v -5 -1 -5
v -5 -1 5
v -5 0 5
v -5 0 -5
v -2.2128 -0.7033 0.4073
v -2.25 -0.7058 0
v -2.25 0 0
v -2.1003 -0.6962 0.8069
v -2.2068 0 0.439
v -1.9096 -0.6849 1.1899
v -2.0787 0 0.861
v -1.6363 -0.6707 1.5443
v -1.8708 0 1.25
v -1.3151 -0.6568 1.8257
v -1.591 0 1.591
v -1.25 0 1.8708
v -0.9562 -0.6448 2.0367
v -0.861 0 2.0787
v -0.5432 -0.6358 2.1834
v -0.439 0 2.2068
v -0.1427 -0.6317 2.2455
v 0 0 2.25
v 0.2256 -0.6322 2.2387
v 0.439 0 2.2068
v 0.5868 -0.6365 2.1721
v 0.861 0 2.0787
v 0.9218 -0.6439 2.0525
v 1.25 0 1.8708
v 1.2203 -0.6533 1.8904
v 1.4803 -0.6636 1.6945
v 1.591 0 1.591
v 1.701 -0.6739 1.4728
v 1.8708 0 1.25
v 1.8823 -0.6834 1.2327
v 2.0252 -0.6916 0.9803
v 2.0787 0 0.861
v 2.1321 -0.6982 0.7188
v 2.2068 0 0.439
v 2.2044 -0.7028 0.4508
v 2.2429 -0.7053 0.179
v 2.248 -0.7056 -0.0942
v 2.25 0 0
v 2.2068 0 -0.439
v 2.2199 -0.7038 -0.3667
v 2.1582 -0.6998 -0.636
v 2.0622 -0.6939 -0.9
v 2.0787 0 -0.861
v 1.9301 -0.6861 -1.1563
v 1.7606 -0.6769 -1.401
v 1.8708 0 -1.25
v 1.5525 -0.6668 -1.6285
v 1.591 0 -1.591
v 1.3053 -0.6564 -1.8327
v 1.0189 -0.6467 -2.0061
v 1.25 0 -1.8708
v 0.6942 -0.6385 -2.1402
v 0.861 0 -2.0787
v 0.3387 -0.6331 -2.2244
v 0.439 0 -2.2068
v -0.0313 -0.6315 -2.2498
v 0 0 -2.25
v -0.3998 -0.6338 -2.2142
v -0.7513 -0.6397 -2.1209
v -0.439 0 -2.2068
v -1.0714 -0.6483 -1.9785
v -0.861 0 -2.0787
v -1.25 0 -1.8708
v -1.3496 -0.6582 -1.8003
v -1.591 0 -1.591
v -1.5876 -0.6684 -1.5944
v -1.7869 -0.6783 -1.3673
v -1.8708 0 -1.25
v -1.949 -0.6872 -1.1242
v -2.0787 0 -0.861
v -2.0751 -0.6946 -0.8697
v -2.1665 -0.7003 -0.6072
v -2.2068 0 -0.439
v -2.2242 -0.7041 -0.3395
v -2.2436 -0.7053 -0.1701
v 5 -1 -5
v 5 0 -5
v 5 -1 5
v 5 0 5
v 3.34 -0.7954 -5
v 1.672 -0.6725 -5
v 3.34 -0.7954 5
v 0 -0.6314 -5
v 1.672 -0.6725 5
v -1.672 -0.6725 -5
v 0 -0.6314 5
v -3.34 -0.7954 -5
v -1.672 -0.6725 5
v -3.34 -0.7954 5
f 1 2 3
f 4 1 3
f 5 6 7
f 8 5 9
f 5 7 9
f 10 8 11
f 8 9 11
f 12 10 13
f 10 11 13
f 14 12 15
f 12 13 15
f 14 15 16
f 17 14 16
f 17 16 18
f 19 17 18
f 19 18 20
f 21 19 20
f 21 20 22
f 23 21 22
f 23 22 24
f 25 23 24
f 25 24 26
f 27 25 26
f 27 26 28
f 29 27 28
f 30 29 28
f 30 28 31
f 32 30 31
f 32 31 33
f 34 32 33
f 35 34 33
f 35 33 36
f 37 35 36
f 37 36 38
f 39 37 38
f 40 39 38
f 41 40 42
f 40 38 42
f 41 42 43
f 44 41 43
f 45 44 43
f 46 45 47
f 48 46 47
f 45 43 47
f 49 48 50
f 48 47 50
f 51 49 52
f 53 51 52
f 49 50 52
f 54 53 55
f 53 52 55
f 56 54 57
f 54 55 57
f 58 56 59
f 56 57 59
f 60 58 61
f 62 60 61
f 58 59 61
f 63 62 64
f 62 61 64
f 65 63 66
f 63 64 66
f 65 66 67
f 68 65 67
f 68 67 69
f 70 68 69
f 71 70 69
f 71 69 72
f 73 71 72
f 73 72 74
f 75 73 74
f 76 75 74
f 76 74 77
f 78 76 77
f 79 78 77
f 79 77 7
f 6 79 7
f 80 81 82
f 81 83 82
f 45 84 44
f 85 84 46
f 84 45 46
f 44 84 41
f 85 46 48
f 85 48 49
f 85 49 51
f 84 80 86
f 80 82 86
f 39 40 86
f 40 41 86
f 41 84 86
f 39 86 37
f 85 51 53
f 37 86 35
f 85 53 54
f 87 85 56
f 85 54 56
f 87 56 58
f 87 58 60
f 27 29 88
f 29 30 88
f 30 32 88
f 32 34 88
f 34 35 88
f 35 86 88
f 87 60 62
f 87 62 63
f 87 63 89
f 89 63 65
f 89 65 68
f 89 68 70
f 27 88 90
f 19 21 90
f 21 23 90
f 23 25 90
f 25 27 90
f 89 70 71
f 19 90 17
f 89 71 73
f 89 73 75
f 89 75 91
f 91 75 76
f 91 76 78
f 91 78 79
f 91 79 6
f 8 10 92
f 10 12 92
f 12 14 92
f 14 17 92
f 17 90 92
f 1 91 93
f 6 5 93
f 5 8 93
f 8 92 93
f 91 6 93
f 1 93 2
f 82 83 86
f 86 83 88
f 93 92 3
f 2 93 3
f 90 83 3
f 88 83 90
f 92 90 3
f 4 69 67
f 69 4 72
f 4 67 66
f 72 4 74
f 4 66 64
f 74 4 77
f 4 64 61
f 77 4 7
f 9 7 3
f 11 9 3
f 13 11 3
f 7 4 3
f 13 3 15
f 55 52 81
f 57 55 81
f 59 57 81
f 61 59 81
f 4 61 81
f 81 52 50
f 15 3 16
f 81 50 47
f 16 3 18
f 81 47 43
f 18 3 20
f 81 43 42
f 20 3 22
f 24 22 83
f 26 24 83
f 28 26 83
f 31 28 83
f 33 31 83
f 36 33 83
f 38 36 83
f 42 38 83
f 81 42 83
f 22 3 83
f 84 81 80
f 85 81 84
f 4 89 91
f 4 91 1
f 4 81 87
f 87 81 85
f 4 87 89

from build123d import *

# Parameters (mm, degrees)
BOSS_EXTRUDE1_DEPTH = 5
SKETCH2_R           = 2.25
CUT_EXTRUDE1_DEPTH  = 8.141428429


with BuildPart() as part:
    # Sketch1 → Boss-Extrude1 (new, symmetric)
    with BuildSketch(Plane.XY):
        with BuildLine():
            Line((-5, 0), (5, 0))
            Line((5, 0), (5, -1))
            ThreePointArc((5, -1), (0, -0.631439341), (-5, -1))
            Line((-5, -1), (-5, 0))
        make_face()
    extrude(amount=BOSS_EXTRUDE1_DEPTH, both=True)

    # Sketch2 → Cut-Extrude1 (cut, through all)
    with BuildSketch(Plane(origin=(0, 0, 0), x_dir=(1, 0, 0), z_dir=(0, 1, 0))):
        with Locations(Location((0, 0, 0), (0, 0, 180))):
            Circle(SKETCH2_R)
    extrude(amount=-CUT_EXTRUDE1_DEPTH, mode=Mode.SUBTRACT)


solid = part.part
